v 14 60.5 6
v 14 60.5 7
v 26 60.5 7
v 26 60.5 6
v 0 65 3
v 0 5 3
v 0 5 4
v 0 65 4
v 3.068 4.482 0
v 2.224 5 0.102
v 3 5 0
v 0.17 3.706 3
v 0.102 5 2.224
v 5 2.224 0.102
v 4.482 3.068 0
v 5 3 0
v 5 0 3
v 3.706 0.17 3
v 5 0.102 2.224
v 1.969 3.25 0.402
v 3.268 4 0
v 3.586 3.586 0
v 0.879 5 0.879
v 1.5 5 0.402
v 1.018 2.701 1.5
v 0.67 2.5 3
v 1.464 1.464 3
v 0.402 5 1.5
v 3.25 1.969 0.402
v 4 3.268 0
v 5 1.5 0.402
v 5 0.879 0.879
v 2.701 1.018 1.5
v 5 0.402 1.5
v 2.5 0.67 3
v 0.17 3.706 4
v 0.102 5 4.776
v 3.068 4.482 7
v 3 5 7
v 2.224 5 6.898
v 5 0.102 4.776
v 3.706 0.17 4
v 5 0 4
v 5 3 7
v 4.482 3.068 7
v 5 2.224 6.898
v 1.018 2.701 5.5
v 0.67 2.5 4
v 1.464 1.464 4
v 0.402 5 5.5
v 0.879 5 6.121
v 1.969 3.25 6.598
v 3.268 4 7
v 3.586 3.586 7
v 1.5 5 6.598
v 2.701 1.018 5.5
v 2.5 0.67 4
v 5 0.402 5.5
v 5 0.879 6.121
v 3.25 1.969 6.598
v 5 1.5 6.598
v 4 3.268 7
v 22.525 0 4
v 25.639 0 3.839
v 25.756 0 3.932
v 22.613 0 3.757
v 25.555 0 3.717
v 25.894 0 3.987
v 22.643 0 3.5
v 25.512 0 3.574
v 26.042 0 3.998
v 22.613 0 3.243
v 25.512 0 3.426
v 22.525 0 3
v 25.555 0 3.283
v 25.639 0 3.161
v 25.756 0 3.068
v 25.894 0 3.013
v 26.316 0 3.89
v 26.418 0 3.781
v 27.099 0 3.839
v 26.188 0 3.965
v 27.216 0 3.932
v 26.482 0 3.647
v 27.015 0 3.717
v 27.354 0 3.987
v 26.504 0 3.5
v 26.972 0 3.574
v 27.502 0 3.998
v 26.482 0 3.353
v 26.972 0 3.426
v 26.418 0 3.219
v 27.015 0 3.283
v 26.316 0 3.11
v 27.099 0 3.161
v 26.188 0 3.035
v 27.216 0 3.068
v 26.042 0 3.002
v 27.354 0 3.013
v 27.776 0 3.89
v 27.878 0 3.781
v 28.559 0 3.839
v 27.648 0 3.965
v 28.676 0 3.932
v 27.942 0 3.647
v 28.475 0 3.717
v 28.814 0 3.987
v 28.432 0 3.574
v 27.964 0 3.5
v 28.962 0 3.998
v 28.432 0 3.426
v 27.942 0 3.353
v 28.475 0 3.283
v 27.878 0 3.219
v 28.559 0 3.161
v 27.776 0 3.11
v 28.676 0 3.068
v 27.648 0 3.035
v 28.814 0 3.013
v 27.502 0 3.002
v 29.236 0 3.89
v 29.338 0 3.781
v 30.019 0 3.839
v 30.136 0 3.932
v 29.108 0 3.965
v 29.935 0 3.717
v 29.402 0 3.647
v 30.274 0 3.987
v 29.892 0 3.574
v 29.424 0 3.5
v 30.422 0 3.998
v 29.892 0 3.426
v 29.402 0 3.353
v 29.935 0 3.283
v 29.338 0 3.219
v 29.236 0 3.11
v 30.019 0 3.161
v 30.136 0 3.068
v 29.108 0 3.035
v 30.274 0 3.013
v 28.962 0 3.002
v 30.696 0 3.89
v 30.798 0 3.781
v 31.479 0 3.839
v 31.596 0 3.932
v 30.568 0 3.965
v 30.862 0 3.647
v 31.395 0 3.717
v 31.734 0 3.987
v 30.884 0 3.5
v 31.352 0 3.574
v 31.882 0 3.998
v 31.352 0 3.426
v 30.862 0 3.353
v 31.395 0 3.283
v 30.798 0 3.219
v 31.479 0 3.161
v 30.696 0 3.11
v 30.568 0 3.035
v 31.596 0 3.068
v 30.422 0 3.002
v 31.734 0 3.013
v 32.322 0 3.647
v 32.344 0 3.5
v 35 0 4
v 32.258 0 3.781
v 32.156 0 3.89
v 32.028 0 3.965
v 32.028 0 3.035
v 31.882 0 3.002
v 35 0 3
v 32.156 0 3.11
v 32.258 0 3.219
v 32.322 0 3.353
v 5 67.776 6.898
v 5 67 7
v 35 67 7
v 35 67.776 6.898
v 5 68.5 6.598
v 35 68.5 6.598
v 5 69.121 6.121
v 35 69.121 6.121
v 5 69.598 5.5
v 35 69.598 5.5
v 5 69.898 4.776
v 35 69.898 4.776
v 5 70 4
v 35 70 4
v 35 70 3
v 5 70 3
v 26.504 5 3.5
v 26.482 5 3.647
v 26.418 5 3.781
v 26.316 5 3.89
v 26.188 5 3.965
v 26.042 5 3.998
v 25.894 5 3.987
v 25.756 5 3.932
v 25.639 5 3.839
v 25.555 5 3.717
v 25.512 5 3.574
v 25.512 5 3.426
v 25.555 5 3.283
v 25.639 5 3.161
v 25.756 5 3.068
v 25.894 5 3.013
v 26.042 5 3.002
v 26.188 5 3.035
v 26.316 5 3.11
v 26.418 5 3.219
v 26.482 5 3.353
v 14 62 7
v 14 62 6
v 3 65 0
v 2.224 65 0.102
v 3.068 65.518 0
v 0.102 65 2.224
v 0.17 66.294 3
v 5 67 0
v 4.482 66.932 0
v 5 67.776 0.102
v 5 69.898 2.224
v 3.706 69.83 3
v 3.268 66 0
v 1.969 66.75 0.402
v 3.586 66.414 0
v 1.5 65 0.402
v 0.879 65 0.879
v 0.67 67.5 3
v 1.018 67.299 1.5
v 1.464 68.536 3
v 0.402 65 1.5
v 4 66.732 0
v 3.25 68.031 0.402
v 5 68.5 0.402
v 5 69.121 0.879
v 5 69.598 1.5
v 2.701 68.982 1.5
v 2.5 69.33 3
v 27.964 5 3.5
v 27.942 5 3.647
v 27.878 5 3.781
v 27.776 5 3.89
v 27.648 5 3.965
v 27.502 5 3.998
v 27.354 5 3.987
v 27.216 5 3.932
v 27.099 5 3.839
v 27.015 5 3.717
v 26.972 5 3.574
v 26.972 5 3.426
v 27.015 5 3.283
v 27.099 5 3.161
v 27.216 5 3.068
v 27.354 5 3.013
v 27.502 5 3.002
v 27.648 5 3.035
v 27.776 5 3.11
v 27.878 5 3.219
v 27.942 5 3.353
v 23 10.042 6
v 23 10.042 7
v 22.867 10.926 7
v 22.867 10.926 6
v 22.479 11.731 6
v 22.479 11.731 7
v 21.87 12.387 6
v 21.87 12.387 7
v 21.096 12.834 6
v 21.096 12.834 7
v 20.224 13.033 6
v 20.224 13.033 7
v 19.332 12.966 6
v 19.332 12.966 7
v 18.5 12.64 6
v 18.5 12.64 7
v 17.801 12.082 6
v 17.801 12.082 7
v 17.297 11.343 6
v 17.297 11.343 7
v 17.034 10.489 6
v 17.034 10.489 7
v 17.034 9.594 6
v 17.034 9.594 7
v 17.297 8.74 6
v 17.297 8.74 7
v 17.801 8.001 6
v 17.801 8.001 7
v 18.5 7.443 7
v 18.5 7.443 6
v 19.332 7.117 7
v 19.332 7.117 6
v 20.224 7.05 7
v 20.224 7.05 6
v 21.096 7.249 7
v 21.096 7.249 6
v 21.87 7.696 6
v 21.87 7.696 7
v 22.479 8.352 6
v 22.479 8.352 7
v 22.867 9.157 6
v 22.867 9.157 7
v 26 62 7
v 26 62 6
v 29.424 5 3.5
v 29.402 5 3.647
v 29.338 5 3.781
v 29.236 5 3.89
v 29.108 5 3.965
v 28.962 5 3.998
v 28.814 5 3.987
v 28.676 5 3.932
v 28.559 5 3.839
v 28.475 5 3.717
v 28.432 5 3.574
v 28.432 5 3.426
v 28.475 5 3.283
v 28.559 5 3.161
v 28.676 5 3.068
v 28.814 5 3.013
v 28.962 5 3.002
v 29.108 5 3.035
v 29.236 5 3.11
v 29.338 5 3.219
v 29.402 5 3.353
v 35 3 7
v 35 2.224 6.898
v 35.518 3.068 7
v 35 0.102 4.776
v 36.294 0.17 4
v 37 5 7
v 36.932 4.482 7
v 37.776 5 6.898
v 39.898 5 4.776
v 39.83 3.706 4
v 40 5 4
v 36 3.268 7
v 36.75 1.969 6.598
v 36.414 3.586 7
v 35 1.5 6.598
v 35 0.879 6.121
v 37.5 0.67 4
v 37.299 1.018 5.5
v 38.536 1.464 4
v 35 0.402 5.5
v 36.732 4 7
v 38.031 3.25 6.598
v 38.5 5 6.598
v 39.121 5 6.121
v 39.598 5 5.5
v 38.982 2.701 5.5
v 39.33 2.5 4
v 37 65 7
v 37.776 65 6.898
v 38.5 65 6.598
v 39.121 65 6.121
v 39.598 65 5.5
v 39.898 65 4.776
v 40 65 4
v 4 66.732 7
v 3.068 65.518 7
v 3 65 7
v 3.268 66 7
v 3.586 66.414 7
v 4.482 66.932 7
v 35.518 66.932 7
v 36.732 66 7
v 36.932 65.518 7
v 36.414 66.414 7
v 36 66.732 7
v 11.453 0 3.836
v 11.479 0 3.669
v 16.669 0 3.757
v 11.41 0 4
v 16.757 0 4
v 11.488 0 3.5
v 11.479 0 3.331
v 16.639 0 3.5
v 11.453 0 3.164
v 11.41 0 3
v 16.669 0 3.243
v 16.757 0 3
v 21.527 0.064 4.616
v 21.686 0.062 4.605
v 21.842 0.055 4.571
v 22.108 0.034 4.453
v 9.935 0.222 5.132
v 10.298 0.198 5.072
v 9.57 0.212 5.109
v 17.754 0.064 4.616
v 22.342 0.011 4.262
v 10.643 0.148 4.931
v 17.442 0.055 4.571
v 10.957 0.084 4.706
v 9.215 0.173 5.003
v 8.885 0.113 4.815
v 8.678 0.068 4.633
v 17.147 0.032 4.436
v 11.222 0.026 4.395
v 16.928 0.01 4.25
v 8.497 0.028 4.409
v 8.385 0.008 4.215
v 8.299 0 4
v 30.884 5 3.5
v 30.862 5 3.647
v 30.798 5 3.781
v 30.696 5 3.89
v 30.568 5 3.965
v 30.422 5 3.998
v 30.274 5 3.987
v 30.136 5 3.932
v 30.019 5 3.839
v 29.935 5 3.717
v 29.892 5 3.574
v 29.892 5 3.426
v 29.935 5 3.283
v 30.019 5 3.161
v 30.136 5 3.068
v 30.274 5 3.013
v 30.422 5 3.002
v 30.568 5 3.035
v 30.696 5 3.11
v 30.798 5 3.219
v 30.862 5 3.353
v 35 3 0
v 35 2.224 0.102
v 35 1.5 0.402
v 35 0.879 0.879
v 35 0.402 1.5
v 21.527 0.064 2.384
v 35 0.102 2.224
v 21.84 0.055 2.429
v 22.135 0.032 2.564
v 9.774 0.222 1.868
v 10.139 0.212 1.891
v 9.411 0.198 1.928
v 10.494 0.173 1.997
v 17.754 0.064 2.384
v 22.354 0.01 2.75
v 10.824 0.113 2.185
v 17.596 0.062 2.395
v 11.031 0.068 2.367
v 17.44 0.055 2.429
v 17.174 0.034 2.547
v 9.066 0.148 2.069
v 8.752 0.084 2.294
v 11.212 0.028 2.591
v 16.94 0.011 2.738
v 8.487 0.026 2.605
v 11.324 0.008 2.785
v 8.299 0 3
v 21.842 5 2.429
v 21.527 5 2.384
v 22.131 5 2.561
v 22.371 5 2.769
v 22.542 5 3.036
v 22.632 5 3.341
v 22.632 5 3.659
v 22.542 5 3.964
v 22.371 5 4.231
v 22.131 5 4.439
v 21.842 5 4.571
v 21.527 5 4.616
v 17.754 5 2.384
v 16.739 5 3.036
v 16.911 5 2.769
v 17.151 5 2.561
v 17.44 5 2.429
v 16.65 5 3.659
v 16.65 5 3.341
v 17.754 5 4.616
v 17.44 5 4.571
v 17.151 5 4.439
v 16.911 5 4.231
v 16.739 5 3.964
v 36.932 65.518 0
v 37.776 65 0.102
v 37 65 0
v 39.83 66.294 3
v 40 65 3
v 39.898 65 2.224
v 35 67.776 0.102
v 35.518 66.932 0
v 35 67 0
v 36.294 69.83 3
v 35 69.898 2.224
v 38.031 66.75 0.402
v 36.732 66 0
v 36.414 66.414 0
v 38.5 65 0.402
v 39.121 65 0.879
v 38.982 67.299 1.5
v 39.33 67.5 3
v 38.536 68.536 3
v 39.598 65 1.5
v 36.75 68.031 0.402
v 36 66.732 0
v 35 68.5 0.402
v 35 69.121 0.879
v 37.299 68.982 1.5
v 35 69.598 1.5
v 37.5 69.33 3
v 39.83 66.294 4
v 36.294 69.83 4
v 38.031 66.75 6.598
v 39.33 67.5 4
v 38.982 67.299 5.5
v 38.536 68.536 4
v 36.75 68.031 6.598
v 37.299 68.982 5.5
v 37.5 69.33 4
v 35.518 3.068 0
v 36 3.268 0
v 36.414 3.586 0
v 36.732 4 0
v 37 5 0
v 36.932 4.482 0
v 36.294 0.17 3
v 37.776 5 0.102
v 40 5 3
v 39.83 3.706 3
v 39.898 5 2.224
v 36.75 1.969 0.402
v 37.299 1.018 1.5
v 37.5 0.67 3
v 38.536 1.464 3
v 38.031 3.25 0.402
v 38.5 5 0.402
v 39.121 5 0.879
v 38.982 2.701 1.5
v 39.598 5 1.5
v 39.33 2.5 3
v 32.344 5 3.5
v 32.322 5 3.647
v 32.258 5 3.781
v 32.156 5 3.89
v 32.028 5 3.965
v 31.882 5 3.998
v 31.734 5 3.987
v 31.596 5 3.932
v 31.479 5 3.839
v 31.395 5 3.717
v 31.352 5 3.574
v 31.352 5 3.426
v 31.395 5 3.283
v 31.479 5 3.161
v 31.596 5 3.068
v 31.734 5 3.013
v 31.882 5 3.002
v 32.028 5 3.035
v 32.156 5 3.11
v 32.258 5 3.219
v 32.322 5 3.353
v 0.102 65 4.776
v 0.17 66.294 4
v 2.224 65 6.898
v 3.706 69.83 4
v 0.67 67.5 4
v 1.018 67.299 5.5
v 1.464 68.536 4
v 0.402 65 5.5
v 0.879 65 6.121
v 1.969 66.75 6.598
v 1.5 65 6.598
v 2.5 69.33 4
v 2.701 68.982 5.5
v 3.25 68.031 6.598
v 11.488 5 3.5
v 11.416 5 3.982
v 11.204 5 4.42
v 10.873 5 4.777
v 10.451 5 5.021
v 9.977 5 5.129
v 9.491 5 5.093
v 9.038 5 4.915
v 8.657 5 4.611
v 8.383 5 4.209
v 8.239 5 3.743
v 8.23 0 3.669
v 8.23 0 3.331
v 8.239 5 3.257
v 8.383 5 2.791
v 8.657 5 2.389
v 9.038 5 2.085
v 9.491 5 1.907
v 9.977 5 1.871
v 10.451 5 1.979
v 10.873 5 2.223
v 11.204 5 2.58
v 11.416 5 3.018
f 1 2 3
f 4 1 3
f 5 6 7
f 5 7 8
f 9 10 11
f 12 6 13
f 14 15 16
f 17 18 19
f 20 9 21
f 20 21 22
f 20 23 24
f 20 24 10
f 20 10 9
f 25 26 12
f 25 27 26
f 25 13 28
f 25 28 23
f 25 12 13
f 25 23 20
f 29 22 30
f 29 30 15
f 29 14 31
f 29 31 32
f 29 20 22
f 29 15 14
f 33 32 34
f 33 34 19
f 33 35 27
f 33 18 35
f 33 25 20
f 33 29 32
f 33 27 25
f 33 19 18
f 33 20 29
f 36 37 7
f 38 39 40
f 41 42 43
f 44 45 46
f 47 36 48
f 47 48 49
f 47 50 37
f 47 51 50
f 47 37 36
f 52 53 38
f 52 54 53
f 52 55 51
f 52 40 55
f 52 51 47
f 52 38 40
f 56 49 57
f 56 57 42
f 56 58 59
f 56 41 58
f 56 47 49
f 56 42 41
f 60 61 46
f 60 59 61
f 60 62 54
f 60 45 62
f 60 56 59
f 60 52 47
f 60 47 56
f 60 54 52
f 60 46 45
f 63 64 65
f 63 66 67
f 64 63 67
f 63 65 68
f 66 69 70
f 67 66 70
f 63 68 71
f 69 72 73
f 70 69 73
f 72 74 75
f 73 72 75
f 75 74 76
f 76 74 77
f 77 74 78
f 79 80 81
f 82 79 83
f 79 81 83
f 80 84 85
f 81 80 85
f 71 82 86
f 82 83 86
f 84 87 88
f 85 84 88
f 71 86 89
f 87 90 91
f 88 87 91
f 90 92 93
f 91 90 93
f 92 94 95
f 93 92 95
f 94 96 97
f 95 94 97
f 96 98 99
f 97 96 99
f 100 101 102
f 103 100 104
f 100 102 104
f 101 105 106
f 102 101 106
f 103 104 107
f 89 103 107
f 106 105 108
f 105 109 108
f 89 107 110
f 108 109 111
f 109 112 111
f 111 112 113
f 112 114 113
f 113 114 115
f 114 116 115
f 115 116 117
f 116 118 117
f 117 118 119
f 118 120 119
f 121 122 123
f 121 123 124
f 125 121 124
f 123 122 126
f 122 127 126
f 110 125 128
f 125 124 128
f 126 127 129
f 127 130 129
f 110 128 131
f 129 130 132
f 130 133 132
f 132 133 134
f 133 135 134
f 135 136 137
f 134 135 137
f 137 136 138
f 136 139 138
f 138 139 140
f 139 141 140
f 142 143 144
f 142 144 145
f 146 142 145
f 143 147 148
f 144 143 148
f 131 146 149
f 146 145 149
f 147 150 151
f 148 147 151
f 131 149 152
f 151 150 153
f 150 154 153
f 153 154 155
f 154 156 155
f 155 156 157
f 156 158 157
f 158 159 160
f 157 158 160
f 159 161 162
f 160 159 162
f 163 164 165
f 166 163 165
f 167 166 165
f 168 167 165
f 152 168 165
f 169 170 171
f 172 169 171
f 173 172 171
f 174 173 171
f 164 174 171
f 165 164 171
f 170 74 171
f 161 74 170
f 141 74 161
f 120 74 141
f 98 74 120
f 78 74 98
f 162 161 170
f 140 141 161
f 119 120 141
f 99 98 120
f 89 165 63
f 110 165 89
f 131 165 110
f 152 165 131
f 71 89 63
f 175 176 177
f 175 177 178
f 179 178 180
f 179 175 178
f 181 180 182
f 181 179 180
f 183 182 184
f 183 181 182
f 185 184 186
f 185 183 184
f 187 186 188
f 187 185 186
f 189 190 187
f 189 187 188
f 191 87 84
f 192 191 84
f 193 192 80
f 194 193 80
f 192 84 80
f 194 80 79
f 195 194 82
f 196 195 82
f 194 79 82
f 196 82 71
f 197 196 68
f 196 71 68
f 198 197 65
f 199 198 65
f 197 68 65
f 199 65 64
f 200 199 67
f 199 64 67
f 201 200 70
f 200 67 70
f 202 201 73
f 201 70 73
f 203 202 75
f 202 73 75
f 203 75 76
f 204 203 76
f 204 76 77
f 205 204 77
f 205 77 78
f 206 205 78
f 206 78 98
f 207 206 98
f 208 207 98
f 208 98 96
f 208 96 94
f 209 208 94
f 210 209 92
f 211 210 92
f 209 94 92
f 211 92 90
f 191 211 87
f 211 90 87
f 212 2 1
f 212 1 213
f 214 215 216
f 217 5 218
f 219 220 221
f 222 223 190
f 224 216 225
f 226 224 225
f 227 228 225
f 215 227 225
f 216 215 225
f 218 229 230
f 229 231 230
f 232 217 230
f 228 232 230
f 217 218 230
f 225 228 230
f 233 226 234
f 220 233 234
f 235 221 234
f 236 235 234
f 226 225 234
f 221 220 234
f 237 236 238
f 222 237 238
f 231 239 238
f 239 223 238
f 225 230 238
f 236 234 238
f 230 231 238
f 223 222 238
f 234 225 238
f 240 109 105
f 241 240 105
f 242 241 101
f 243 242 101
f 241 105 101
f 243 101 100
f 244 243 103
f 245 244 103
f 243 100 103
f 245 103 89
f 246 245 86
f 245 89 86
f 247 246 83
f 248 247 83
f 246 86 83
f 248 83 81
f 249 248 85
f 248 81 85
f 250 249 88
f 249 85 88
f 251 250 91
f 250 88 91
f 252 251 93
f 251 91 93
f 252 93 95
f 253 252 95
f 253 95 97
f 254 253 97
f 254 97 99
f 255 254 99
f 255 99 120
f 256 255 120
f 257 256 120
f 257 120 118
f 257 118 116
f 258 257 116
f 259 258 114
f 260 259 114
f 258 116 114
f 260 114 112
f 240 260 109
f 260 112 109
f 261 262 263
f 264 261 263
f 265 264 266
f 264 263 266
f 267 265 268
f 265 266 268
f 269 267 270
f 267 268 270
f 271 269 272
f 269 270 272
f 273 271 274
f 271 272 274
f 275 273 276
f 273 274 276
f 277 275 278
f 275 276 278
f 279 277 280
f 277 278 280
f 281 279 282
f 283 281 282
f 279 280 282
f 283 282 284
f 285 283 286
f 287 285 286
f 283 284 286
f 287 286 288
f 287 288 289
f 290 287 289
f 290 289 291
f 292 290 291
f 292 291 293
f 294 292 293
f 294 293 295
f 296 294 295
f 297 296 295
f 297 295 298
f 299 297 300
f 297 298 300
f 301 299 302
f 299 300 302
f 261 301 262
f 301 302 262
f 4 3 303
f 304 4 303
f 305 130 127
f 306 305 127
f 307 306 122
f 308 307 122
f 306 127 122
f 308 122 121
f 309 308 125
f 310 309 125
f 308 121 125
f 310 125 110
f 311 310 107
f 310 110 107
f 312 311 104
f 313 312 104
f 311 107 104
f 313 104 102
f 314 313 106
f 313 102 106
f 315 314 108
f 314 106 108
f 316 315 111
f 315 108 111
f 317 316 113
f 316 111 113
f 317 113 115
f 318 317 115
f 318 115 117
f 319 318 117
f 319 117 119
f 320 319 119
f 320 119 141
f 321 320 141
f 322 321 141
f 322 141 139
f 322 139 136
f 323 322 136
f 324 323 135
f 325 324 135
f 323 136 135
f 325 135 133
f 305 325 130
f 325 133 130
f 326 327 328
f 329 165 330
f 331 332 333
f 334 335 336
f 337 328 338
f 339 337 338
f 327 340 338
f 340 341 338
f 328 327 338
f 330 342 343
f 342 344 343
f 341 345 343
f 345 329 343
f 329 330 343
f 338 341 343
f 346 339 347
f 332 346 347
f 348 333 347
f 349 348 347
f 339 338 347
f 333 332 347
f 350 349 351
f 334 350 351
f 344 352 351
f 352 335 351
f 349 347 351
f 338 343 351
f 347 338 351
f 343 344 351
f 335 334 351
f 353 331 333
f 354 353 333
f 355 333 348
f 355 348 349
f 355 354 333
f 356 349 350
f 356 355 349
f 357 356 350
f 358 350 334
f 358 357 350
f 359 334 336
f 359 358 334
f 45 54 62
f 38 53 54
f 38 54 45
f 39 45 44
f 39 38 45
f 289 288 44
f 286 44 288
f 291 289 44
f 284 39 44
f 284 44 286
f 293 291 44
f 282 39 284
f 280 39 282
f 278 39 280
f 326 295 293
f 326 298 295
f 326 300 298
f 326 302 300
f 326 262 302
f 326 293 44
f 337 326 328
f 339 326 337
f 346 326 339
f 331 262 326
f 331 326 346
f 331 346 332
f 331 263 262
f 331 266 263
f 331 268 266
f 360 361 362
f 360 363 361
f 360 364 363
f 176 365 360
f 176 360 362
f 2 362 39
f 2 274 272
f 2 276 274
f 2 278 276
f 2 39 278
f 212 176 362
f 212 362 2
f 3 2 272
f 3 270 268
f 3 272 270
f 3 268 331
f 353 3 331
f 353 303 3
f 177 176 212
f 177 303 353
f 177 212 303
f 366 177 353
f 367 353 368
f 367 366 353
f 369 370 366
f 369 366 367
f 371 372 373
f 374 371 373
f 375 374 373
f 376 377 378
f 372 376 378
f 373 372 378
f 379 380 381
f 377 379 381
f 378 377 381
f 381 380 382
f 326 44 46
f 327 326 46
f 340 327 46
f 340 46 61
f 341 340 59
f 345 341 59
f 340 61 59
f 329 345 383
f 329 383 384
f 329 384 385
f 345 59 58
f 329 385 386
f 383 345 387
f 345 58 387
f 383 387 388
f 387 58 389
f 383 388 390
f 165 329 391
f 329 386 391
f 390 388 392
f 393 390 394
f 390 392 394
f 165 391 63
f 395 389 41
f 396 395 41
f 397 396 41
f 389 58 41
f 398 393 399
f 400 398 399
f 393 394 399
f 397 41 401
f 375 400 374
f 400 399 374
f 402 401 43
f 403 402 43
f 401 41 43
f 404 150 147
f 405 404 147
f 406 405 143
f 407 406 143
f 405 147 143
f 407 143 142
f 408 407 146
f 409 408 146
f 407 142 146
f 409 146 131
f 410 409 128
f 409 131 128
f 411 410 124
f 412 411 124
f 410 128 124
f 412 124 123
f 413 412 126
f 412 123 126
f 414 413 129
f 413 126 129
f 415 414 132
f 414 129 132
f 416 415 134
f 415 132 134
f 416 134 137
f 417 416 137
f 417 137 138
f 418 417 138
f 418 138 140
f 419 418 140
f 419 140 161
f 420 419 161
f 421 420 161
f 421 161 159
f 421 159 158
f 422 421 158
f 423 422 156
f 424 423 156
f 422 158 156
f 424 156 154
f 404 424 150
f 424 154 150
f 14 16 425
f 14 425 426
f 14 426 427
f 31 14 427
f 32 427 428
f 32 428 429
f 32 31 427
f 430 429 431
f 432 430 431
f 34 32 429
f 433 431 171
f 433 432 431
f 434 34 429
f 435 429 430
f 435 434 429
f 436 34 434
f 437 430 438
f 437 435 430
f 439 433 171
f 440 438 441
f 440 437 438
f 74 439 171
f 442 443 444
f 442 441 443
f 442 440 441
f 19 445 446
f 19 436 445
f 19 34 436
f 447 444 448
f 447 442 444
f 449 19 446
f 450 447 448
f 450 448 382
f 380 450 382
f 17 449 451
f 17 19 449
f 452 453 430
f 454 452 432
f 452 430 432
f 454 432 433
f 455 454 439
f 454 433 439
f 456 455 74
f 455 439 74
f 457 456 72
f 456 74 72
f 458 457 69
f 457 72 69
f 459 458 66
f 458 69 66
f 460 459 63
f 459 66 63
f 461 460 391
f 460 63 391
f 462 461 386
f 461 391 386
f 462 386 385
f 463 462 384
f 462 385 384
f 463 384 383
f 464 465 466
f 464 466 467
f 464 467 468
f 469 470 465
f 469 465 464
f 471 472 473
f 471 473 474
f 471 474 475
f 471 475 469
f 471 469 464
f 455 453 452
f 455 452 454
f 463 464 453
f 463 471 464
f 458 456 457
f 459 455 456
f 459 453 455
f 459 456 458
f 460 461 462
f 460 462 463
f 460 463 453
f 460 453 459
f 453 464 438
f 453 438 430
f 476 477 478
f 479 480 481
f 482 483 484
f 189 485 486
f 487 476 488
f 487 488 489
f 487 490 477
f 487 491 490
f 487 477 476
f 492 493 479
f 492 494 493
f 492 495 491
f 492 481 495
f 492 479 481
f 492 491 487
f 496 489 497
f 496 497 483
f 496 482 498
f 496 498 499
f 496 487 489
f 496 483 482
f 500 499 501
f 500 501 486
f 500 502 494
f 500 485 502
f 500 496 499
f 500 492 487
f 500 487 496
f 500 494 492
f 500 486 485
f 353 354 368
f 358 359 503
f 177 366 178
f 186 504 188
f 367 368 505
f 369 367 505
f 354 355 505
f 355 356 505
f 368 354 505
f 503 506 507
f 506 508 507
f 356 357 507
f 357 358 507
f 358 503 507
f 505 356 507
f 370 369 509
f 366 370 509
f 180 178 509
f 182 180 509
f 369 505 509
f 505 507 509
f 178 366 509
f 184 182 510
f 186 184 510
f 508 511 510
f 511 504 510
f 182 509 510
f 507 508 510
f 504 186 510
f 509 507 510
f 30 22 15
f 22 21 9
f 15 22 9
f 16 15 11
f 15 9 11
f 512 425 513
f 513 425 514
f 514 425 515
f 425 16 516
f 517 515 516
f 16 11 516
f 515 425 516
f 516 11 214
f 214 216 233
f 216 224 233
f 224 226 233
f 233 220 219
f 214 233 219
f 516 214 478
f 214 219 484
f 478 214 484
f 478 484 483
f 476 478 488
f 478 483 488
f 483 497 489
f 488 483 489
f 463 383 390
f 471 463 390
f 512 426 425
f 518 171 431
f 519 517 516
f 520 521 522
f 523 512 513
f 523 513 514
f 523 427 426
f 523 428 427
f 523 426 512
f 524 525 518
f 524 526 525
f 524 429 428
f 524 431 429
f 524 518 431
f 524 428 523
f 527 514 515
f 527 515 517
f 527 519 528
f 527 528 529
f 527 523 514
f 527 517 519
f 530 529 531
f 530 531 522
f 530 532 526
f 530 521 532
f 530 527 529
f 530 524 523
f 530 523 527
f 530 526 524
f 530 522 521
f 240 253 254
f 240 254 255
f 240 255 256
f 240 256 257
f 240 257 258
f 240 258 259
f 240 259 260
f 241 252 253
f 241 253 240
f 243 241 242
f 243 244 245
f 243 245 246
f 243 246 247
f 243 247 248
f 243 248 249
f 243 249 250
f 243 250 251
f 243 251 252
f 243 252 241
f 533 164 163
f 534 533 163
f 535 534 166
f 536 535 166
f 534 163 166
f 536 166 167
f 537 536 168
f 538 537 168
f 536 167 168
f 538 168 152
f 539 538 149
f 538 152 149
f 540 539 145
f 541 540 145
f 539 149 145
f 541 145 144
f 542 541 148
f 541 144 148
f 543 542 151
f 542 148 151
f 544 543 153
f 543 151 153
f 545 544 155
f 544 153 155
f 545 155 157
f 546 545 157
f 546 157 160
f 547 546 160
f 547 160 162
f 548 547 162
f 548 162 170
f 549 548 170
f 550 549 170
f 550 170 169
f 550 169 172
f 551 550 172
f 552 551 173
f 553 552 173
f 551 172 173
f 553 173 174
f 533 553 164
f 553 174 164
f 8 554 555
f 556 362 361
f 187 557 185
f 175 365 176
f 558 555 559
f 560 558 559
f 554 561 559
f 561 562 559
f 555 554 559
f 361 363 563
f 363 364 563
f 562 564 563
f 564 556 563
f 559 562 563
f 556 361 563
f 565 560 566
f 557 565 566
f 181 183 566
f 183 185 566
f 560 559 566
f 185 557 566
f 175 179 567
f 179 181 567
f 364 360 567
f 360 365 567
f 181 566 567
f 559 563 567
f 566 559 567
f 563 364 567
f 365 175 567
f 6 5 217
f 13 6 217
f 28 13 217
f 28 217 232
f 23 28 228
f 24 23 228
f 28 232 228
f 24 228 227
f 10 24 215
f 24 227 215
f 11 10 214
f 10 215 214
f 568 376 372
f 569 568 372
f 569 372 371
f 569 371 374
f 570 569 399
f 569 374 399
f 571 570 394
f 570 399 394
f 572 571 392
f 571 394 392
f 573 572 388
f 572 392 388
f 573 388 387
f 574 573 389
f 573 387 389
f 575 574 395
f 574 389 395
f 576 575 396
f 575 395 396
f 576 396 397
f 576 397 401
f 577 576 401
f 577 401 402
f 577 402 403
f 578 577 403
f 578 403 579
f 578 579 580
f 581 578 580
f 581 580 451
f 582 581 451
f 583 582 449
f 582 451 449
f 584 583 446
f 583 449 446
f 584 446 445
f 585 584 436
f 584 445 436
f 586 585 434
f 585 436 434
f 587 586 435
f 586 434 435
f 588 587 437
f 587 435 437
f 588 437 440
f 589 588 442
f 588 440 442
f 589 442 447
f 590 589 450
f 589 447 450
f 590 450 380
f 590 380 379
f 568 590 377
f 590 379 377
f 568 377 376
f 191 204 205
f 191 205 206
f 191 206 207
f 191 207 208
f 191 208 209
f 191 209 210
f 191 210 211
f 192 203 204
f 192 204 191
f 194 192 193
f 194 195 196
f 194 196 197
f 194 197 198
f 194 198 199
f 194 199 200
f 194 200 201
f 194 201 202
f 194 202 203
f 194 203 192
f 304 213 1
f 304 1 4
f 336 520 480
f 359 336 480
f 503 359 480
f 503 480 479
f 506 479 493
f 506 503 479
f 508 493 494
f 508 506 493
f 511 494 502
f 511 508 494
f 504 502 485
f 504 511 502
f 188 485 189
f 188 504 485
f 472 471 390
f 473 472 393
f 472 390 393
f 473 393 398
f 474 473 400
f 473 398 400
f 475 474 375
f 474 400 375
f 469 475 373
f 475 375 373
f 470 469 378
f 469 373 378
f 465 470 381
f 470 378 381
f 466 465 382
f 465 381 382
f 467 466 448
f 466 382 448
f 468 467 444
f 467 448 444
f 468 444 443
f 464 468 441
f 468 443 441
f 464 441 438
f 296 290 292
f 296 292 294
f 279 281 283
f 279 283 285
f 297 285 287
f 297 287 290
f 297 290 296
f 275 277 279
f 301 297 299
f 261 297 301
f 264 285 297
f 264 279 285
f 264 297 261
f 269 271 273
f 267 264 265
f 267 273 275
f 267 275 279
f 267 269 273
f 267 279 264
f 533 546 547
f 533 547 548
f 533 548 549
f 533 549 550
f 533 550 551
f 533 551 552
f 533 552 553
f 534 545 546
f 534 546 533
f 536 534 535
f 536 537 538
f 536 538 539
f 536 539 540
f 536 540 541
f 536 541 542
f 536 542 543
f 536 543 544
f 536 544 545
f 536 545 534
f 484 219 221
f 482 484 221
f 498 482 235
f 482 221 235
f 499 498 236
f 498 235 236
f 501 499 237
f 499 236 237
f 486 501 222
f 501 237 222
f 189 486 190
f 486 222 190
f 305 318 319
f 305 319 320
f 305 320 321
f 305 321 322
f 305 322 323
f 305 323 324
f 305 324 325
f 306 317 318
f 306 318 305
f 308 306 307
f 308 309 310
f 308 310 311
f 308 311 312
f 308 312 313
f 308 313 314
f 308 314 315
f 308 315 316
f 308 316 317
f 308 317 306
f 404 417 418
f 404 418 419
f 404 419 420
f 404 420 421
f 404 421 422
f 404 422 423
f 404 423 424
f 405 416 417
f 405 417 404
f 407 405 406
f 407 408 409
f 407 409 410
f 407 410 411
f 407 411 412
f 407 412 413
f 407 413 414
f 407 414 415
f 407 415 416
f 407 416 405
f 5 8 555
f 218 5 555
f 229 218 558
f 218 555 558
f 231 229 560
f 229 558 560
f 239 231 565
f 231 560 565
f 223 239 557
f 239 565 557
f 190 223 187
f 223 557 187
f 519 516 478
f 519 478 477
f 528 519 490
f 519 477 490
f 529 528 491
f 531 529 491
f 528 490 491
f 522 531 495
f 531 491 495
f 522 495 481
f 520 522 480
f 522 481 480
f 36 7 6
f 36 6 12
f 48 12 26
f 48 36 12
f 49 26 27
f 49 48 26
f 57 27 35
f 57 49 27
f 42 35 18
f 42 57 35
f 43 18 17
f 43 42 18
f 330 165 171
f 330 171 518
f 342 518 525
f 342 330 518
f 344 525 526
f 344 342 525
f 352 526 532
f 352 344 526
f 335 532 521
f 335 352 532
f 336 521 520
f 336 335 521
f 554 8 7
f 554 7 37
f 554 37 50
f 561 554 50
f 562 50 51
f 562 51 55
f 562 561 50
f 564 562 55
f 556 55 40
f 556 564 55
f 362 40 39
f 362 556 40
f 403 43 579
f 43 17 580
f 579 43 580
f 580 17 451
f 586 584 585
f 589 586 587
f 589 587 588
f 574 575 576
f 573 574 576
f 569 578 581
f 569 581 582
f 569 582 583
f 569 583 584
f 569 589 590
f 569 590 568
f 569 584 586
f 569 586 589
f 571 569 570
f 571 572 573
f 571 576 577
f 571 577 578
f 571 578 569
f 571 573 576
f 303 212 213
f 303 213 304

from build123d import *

# Parameters (mm, degrees)
F0_W         = 40
F0_H         = 70
F1_DEPTH     = 7
F2_R         = 5
F3_R         = 0.4991012629
F3_R_2       = 1.6336823689
F4_DEPTH     = 5
F5_T1_DEPTH  = 60
F5_T3_DEPTH  = 30
F5_T6_ANGLE  = 90
F5_T8_ANGLE  = 90
F5_T10_ANGLE = 90
F5_T12_ANGLE = 90
F5_T14_ANGLE = 90
F5_T16_ANGLE = 90
F5_T18_ANGLE = 90
F5_T20_ANGLE = 90
F6_R         = 3
F6_W         = 12
F6_H         = 1.5
F7_DEPTH     = 1


# Not quite as in the source:
# - a fillet or chamfer that OpenCascade refuses, or shapes differently, is made with other operations: its cross-section is extruded or revolved along the edge and cut away or added


with BuildPart() as f1:
    # F0 (on Top) → F1 (new body)
    with BuildSketch(Plane.XY):
        with Locations((20, 35)):
            Rectangle(F0_W, F0_H)
    extrude(amount=F1_DEPTH)

    # F2
    f2_edges = [f1.edges().sort_by_distance(p)[0] for p in [
        (40, 0, 3.5),
        (0, 0, 3.5),
        (40, 70, 3.5),
        (0, 70, 3.5),
    ]]
    fillet(f2_edges, radius=F2_R)

    # F3 (on face) → F4 (cut)
    with BuildSketch(Plane.XZ):
        with BuildLine():
            Line((21.5274822088, 4.6158107299), (17.7544243634, 4.6158107708))
            ThreePointArc((17.7544243634, 4.6158107708), (16.6386135926, 3.5), (17.7544243634, 2.3841892292))
            Line((17.7544243634, 2.3841892292), (21.5274822088, 2.3841892701))
            ThreePointArc((21.5274822088, 2.3841892701), (22.6432929266, 3.5), (21.5274822088, 4.6158107299))
        make_face()
        with Locations((26.0051637888, 3.5)):
            Circle(F3_R)
        with Locations((27.4651637888, 3.5)):
            Circle(F3_R)
        with Locations((28.9251637888, 3.5)):
            Circle(F3_R)
        with Locations((30.3851637888, 3.5)):
            Circle(F3_R)
        with Locations((31.8451637888, 3.5)):
            Circle(F3_R)
        with Locations((9.854494594, 3.5)):
            Circle(F3_R_2)
    extrude(amount=-F4_DEPTH, mode=Mode.SUBTRACT)

    # F5: fillet of radius 3 on 16 edges, made by hand

    # F5_s2 → F5_t1 (cut)
    with BuildSketch(Plane.XZ.offset(-65)):
        with BuildLine():
            ThreePointArc((0, 4), (0.8786796564, 6.1213203436), (3, 7))
            Line((3, 7), (0, 7))
            Line((0, 7), (0, 4))
        make_face()
        with BuildLine():
            ThreePointArc((0, 3), (0.8786796564, 0.8786796564), (3, 0))
            Line((3, 0), (0, 0))
            Line((0, 0), (0, 3))
        make_face()
        with BuildLine():
            ThreePointArc((37, 0), (39.1213203436, 0.8786796564), (40, 3))
            Line((40, 3), (40, 0))
            Line((40, 0), (37, 0))
        make_face()
        with BuildLine():
            ThreePointArc((37, 7), (39.1213203436, 6.1213203436), (40, 4))
            Line((40, 4), (40, 7))
            Line((40, 7), (37, 7))
        make_face()
    extrude(amount=F5_T1_DEPTH, mode=Mode.SUBTRACT)

    # F5_s4 → F5_t3 (cut)
    with BuildSketch(Plane.YZ.offset(5)):
        with BuildLine():
            ThreePointArc((67, 0), (69.1213203436, 0.8786796564), (70, 3))
            Line((70, 3), (70, 0))
            Line((70, 0), (67, 0))
        make_face()
        with BuildLine():
            ThreePointArc((3, 0), (0.8786796564, 0.8786796564), (0, 3))
            Line((0, 3), (0, 0))
            Line((0, 0), (3, 0))
        make_face()
        with BuildLine():
            ThreePointArc((67, 7), (69.1213203436, 6.1213203436), (70, 4))
            Line((70, 4), (70, 7))
            Line((70, 7), (67, 7))
        make_face()
        with BuildLine():
            ThreePointArc((3, 7), (0.8786796564, 6.1213203436), (0, 4))
            Line((0, 4), (0, 7))
            Line((0, 7), (3, 7))
        make_face()
    extrude(amount=F5_T3_DEPTH, mode=Mode.SUBTRACT)

    # F5_s5 → F5_t6 (revolve, cut)
    with BuildSketch(Plane.XZ.offset(-65)):
        with BuildLine():
            ThreePointArc((3, 0), (0.8786796564, 0.8786796564), (0, 3))
            Line((0, 3), (0, 0))
            Line((0, 0), (3, 0))
        make_face()
    revolve(axis=Axis((5, 65, 0), (0, 0, -1)), revolution_arc=F5_T6_ANGLE, mode=Mode.SUBTRACT)

    # F5_s7 → F5_t8 (revolve, cut)
    with BuildSketch(Plane.XZ.offset(-5)):
        with BuildLine():
            ThreePointArc((3, 0), (0.8786796564, 0.8786796564), (0, 3))
            Line((0, 3), (0, 0))
            Line((0, 0), (3, 0))
        make_face()
    revolve(axis=Axis((5, 5, 0), (0, 0, 1)), revolution_arc=F5_T8_ANGLE, mode=Mode.SUBTRACT)

    # F5_s9 → F5_t10 (revolve, cut)
    with BuildSketch(Plane.XZ.offset(-65)):
        with BuildLine():
            ThreePointArc((37, 0), (39.1213203436, 0.8786796564), (40, 3))
            Line((40, 3), (40, 0))
            Line((40, 0), (37, 0))
        make_face()
    revolve(axis=Axis((35, 65, 0), (0, 0, 1)), revolution_arc=F5_T10_ANGLE, mode=Mode.SUBTRACT)

    # F5_s11 → F5_t12 (revolve, cut)
    with BuildSketch(Plane.YZ.offset(35)):
        with BuildLine():
            ThreePointArc((3, 0), (0.8786796564, 0.8786796564), (0, 3))
            Line((0, 3), (0, 0))
            Line((0, 0), (3, 0))
        make_face()
    revolve(axis=Axis((35, 5, 0), (0, 0, 1)), revolution_arc=F5_T12_ANGLE, mode=Mode.SUBTRACT)

    # F5_s13 → F5_t14 (revolve, cut)
    with BuildSketch(Plane.XZ.offset(-65)):
        with BuildLine():
            ThreePointArc((0, 4), (0.8786796564, 6.1213203436), (3, 7))
            Line((3, 7), (0, 7))
            Line((0, 7), (0, 4))
        make_face()
    revolve(axis=Axis((5, 65, 7), (0, 0, -1)), revolution_arc=F5_T14_ANGLE, mode=Mode.SUBTRACT)

    # F5_s15 → F5_t16 (revolve, cut)
    with BuildSketch(Plane.XZ.offset(-5)):
        with BuildLine():
            ThreePointArc((0, 4), (0.8786796564, 6.1213203436), (3, 7))
            Line((3, 7), (0, 7))
            Line((0, 7), (0, 4))
        make_face()
    revolve(axis=Axis((5, 5, 7), (0, 0, 1)), revolution_arc=F5_T16_ANGLE, mode=Mode.SUBTRACT)

    # F5_s17 → F5_t18 (revolve, cut)
    with BuildSketch(Plane.XZ.offset(-65)):
        with BuildLine():
            ThreePointArc((37, 7), (39.1213203436, 6.1213203436), (40, 4))
            Line((40, 4), (40, 7))
            Line((40, 7), (37, 7))
        make_face()
    revolve(axis=Axis((35, 65, 7), (0, 0, 1)), revolution_arc=F5_T18_ANGLE, mode=Mode.SUBTRACT)

    # F5_s19 → F5_t20 (revolve, cut)
    with BuildSketch(Plane.YZ.offset(35)):
        with BuildLine():
            ThreePointArc((3, 7), (0.8786796564, 6.1213203436), (0, 4))
            Line((0, 4), (0, 7))
            Line((0, 7), (3, 7))
        make_face()
    revolve(axis=Axis((35, 5, 7), (0, 0, 1)), revolution_arc=F5_T20_ANGLE, mode=Mode.SUBTRACT)

    # F6 (on face) → F7 (cut)
    with BuildSketch(Plane.XY.offset(7)):
        with Locations((20, 10.0415023044)):
            Circle(F6_R)
        with Locations((20, 61.25)):
            Rectangle(F6_W, F6_H)
    extrude(amount=-F7_DEPTH, mode=Mode.SUBTRACT)


solid = f1.part
